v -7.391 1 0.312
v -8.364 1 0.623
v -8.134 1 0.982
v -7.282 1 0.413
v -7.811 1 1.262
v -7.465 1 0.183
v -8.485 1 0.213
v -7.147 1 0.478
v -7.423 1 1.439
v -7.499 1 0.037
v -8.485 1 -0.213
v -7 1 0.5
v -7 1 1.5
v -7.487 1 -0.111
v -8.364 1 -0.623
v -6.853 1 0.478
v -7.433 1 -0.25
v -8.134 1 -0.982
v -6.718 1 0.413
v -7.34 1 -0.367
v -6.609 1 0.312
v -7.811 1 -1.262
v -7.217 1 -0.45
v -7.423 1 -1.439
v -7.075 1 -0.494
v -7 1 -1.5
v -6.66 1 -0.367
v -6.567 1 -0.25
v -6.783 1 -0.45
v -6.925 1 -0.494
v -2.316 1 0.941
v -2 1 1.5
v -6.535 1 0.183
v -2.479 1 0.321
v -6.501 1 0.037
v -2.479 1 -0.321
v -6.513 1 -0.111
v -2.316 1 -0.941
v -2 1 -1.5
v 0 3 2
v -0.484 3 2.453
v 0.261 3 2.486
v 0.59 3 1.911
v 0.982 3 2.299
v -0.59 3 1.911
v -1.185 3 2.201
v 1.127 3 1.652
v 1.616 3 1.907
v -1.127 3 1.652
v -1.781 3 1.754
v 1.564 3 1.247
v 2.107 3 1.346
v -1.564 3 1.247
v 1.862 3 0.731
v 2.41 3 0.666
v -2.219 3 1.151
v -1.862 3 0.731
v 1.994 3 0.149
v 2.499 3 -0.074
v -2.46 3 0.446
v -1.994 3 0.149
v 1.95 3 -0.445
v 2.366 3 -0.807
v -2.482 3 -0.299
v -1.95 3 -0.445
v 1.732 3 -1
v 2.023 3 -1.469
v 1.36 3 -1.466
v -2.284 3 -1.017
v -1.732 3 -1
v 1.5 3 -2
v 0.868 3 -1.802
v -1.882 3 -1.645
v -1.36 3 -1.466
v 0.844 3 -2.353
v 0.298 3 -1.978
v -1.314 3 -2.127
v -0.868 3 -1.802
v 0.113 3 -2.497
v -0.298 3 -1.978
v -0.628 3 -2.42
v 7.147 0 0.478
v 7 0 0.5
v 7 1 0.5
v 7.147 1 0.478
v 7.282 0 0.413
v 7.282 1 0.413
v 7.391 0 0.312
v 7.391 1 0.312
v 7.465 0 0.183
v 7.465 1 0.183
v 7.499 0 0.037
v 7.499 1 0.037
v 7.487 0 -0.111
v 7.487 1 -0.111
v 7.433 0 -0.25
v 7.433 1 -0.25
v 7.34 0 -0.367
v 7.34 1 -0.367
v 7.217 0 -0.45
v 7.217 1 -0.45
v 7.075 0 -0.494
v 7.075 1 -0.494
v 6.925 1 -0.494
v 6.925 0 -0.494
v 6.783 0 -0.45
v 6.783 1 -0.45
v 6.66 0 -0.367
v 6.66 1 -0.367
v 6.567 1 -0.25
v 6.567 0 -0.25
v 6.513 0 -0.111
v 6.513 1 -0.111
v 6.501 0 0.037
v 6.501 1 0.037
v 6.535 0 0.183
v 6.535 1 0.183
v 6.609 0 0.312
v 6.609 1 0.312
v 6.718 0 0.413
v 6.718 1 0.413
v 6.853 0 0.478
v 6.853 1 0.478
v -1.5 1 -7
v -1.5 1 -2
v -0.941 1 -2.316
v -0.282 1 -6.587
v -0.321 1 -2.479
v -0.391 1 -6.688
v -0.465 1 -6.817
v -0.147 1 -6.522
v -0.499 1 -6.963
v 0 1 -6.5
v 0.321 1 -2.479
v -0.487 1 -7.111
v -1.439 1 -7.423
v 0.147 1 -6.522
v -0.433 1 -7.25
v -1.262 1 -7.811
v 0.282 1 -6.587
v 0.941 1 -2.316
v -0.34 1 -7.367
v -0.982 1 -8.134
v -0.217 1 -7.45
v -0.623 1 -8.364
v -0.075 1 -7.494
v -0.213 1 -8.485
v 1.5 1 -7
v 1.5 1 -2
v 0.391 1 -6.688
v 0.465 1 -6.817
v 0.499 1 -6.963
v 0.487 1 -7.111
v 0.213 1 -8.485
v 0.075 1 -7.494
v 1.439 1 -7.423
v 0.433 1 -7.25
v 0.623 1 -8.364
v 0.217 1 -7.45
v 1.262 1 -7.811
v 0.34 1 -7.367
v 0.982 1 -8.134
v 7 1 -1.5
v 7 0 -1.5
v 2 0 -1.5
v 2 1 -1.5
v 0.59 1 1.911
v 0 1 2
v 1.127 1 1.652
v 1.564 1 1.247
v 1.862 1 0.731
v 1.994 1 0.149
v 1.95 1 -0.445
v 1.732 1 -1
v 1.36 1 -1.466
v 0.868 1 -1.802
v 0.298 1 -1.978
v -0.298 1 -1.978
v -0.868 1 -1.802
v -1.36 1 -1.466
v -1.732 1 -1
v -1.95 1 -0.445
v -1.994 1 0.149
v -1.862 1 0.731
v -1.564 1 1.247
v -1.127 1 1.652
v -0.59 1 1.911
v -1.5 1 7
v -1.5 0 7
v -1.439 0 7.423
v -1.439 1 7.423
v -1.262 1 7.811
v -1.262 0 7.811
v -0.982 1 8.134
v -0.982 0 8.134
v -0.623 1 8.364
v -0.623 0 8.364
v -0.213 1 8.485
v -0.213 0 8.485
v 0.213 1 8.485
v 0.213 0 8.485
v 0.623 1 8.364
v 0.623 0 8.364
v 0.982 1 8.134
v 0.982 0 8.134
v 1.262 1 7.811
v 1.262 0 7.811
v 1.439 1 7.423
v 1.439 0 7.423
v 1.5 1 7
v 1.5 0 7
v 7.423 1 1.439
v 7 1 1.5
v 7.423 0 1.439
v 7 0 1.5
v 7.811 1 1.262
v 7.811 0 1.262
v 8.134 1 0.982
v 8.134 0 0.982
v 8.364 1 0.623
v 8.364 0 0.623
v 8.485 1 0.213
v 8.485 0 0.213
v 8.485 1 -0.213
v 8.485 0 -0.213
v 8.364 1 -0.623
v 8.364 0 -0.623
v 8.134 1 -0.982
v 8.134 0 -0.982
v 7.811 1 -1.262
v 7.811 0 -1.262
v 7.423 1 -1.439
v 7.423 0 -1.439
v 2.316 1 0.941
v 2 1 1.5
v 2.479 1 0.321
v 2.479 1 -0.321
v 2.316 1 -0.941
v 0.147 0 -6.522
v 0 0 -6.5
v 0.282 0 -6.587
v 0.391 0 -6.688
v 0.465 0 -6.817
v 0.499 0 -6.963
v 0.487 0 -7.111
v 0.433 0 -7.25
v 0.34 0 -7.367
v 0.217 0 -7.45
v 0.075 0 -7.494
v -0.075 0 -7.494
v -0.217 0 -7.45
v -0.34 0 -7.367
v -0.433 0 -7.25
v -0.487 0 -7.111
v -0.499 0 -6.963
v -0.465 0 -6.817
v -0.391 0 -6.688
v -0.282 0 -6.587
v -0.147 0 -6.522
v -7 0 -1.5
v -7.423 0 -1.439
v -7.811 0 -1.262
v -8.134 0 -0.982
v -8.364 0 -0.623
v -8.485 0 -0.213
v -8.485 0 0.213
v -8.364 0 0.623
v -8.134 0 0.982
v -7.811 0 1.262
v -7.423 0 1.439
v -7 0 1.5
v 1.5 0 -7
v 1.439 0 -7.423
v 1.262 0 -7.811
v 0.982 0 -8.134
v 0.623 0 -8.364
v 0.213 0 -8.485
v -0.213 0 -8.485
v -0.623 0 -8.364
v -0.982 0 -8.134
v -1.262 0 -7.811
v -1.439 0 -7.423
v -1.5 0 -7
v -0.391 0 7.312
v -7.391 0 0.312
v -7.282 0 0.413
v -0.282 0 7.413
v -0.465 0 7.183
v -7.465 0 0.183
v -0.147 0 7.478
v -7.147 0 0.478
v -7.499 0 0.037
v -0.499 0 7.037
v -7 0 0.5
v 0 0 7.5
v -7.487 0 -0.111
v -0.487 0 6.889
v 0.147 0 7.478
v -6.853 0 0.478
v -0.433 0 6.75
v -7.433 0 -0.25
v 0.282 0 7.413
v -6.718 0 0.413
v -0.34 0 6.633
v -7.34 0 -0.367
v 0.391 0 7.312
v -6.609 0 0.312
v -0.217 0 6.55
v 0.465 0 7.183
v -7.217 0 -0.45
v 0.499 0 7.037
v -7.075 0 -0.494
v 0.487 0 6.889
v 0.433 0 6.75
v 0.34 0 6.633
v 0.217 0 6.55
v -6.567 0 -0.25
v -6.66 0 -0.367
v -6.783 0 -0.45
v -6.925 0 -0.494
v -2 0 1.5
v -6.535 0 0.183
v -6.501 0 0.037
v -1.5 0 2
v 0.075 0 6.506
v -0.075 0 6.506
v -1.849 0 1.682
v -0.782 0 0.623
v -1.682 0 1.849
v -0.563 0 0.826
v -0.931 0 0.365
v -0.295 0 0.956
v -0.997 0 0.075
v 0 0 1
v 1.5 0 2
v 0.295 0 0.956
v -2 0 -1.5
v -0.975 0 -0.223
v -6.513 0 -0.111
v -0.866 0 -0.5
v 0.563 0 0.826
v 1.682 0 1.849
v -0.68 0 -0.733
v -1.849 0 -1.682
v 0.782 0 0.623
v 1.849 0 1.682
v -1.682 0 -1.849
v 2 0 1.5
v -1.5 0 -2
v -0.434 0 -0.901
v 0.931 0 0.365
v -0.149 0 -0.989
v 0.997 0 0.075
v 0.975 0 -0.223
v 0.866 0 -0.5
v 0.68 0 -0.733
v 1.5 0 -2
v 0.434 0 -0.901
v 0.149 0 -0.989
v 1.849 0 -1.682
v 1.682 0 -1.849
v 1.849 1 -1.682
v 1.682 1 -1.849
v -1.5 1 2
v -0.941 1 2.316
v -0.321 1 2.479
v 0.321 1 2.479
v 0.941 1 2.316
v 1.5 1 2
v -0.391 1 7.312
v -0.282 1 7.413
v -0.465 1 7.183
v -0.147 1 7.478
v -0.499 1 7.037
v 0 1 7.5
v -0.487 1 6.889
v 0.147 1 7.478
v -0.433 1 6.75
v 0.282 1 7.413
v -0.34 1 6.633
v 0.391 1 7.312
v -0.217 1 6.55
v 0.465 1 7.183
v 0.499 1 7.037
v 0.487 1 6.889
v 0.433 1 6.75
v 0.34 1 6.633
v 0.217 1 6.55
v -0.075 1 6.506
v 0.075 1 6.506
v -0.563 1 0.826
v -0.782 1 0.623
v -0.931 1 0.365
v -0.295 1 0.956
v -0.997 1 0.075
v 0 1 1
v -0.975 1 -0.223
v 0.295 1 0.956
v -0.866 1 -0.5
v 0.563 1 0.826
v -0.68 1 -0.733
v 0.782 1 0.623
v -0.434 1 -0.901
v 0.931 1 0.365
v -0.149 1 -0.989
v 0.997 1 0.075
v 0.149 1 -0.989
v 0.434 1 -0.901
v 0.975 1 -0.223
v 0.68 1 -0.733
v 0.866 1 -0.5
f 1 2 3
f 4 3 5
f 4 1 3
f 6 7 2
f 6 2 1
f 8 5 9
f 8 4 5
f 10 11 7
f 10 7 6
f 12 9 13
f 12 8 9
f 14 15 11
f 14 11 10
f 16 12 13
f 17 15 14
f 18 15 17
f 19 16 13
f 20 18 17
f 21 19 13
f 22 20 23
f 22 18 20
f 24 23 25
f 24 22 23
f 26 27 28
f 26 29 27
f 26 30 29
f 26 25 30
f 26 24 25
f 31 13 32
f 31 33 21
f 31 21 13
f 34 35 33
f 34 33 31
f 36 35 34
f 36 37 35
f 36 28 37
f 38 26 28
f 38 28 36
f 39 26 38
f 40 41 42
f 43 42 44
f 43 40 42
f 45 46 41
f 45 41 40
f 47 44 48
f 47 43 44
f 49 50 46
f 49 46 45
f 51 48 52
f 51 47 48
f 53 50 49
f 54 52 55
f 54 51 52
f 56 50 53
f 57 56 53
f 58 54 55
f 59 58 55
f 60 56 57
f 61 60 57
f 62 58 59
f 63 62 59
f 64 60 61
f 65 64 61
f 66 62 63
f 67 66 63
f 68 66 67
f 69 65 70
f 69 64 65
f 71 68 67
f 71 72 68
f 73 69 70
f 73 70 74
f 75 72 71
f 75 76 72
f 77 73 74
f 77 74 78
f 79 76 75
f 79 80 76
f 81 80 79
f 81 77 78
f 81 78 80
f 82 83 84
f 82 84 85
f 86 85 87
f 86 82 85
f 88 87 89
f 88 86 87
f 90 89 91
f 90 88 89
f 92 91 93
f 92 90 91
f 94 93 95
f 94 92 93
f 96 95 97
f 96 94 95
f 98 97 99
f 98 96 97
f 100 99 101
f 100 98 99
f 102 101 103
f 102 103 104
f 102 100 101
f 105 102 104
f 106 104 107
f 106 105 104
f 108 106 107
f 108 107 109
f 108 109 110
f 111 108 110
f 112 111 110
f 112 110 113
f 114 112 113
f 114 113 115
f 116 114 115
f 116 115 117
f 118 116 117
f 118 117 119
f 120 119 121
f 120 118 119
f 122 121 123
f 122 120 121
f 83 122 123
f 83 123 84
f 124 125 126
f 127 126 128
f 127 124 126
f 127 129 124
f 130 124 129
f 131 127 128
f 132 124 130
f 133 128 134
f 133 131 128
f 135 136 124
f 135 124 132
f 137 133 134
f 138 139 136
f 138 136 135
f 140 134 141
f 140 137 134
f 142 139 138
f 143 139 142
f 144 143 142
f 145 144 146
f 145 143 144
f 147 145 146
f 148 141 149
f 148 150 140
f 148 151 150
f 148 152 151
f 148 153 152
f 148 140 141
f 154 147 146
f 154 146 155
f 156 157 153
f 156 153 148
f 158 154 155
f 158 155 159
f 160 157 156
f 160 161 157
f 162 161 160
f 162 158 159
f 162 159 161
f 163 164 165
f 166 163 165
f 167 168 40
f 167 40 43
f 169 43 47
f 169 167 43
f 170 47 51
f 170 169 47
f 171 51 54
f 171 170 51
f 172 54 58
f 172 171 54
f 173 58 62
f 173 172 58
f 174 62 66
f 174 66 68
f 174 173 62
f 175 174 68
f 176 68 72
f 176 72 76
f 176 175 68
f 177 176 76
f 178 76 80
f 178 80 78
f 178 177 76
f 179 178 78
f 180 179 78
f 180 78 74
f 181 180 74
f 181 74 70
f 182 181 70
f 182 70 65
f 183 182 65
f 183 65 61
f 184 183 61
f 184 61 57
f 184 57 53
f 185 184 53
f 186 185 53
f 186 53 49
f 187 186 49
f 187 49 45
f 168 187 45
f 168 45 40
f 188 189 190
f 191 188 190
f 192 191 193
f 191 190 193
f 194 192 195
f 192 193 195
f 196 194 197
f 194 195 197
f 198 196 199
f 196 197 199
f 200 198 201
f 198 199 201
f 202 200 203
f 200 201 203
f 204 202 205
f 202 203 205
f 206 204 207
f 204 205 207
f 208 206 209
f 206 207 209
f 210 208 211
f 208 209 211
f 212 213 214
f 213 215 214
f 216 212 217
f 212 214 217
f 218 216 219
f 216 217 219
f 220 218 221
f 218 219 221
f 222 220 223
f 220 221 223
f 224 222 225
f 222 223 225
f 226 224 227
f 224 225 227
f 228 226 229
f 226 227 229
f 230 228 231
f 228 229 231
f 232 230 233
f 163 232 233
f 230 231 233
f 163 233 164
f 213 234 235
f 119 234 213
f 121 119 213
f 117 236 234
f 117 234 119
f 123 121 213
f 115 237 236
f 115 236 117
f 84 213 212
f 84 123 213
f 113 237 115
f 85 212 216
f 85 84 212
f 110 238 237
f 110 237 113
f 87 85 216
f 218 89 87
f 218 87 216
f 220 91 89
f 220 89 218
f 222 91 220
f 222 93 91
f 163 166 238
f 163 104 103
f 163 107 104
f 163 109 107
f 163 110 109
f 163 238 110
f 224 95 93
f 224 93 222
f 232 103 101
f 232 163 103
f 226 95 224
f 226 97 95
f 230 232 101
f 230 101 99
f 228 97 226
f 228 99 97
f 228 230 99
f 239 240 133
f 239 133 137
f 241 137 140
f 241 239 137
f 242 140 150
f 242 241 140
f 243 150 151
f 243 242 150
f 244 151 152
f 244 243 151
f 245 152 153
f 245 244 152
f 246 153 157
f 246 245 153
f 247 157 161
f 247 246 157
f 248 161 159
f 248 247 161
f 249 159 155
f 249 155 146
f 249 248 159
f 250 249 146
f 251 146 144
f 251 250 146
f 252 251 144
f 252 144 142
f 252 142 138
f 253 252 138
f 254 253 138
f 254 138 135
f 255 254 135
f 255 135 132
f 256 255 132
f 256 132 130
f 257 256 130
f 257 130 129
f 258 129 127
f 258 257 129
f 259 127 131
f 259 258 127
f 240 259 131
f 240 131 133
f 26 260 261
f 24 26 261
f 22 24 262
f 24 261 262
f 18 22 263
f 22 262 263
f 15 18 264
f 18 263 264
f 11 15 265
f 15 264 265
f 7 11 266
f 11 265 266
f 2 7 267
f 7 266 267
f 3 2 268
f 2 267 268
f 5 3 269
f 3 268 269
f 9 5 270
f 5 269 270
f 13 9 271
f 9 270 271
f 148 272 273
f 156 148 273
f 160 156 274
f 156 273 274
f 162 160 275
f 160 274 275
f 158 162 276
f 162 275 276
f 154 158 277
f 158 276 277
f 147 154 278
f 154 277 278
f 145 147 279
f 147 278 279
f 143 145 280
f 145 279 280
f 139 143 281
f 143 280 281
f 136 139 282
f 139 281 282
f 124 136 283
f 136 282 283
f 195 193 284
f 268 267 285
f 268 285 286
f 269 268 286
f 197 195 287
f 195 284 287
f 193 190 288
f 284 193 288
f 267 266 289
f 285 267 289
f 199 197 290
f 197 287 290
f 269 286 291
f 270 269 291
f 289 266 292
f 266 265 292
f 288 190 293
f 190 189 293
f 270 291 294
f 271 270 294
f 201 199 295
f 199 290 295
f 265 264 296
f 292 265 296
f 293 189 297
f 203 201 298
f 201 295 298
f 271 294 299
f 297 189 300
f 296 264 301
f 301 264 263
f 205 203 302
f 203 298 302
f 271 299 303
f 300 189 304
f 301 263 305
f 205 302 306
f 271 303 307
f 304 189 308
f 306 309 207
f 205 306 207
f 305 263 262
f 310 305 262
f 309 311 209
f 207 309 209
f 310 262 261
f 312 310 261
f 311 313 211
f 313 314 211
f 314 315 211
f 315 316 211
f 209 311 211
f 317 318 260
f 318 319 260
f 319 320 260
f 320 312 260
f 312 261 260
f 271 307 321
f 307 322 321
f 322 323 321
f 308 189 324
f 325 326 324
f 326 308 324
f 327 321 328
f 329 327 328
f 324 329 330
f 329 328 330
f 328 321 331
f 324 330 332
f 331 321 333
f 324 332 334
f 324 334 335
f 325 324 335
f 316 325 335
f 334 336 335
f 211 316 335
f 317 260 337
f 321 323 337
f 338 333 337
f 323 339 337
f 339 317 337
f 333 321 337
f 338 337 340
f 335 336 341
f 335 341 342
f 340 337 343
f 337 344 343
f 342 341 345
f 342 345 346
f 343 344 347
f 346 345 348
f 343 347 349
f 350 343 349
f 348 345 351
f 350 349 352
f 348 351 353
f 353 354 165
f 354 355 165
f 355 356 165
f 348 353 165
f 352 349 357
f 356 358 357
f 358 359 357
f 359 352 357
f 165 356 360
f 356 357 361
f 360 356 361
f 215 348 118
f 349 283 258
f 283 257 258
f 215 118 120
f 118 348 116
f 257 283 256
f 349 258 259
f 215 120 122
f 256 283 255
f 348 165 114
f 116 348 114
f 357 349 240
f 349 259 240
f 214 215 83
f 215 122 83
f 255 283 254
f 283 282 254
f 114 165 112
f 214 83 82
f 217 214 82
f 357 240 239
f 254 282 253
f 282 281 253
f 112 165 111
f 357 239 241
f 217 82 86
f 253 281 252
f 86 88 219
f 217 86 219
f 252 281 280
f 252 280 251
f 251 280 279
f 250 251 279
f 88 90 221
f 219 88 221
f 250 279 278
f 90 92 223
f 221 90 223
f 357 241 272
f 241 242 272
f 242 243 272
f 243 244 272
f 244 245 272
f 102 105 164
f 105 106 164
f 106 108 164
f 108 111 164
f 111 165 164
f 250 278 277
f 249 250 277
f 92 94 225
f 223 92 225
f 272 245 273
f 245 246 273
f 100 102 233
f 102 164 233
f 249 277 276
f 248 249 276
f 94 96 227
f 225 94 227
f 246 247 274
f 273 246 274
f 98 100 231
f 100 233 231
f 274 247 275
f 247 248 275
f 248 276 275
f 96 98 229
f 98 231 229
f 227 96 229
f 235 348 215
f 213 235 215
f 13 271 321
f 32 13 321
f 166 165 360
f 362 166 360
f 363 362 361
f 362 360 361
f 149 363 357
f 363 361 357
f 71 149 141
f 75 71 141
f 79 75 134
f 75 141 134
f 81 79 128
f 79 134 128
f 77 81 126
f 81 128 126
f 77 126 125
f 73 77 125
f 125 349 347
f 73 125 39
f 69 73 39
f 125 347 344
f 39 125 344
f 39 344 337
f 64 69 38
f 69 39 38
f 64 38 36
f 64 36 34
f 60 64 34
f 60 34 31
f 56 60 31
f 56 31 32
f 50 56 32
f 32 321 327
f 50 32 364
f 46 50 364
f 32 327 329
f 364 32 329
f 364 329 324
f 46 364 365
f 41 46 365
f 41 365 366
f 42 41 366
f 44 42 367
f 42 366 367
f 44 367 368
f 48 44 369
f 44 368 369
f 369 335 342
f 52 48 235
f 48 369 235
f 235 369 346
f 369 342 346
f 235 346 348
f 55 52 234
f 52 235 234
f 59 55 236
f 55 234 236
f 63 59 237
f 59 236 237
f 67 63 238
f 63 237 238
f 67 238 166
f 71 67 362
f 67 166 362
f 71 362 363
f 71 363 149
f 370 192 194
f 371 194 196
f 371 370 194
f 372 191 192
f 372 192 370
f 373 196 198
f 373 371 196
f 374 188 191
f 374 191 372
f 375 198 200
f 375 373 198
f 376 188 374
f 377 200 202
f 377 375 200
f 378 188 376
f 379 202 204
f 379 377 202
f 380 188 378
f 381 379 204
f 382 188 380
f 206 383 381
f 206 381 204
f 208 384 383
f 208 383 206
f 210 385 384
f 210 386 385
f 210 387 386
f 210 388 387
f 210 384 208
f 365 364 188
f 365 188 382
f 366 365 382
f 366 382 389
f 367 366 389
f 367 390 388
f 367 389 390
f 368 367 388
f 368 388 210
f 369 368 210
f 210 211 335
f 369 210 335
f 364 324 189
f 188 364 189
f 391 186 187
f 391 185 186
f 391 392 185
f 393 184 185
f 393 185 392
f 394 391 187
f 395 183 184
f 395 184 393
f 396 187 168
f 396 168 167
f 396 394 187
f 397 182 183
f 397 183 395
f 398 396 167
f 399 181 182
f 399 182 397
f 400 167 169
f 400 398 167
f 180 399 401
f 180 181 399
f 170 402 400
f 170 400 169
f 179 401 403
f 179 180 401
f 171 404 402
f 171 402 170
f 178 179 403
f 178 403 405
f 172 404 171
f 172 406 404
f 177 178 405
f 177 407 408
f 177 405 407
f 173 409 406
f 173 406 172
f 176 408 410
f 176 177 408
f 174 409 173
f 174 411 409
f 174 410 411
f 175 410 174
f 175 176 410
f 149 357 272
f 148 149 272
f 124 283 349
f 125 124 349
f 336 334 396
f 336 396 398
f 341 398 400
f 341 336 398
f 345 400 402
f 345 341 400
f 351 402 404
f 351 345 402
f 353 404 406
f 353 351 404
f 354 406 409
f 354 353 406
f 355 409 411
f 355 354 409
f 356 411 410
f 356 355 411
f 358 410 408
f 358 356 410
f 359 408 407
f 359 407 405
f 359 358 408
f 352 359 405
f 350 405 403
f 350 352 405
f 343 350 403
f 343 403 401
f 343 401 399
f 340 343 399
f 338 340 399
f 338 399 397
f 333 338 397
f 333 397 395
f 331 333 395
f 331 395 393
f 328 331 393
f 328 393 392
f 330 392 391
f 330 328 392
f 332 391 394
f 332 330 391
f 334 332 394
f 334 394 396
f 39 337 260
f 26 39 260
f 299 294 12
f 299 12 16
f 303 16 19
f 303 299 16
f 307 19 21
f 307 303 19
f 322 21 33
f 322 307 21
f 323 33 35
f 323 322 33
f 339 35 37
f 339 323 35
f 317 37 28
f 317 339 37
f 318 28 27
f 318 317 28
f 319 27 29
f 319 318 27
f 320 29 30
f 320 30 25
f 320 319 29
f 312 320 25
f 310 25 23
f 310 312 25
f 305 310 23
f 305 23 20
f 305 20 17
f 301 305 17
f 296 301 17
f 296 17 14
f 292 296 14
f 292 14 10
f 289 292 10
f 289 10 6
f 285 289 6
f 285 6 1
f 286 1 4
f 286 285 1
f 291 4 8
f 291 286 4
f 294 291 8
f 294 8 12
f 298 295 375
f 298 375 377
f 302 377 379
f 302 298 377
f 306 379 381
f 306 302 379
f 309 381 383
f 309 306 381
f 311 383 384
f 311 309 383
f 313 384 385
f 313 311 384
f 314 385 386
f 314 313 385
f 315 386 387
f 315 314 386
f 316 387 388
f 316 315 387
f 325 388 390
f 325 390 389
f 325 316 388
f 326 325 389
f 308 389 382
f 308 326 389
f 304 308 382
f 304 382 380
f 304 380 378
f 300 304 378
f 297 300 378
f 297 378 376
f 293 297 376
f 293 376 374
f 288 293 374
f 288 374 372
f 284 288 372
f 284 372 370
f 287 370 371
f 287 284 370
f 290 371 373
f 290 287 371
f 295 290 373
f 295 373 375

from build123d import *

# Parameters (mm, degrees)
SKETCH4_R           = 0.5
SKETCH4_R_2         = 1
BOSS_EXTRUDE1_DEPTH = 1
SKETCH4_3_R         = 2.5
SKETCH4_3_R_2       = 2
BOSS_EXTRUDE2_DEPTH = 3


with BuildPart() as part:
    # Sketch4 → Boss-Extrude1 (new body)
    with BuildSketch(Plane(origin=(0, 0, 0), x_dir=(1, 0, 0), z_dir=(0, 1, 0))):
        with BuildLine():
            Line((2, -1.5), (7, -1.5))
            ThreePointArc((7, -1.5), (8.5, 0), (7, 1.5))
            Line((7, 1.5), (2, 1.5))
            ThreePointArc((2, 1.5), (1.767766953, 1.767766953), (1.5, 2))
            Line((1.5, 2), (1.5, 7))
            ThreePointArc((1.5, 7), (0, 8.5), (-1.5, 7))
            Line((-1.5, 7), (-1.5, 2))
            ThreePointArc((-1.5, 2), (-1.767766953, 1.767766953), (-2, 1.5))
            Line((-2, 1.5), (-7, 1.5))
            ThreePointArc((-7, 1.5), (-8.5, 0), (-7, -1.5))
            Line((-7, -1.5), (-2, -1.5))
            ThreePointArc((-2, -1.5), (-1.767766953, -1.767766953), (-1.5, -2))
            Line((-1.5, -2), (-1.5, -7))
            ThreePointArc((-1.5, -7), (0, -8.5), (1.5, -7))
            Line((1.5, -7), (1.5, -2))
            ThreePointArc((1.5, -2), (1.767766953, -1.767766953), (2, -1.5))
        make_face()
        with Locations((7, 0)):
            Circle(SKETCH4_R, mode=Mode.SUBTRACT)
        Circle(SKETCH4_R_2, mode=Mode.SUBTRACT)
        with Locations((0, -7)):
            Circle(SKETCH4_R, mode=Mode.SUBTRACT)
        with Locations((-7, 0)):
            Circle(SKETCH4_R, mode=Mode.SUBTRACT)
        with Locations((0, 7)):
            Circle(SKETCH4_R, mode=Mode.SUBTRACT)
    extrude(amount=BOSS_EXTRUDE1_DEPTH)

    # Sketch4<3> → Boss-Extrude2 (add)
    with BuildSketch(Plane(origin=(0, 0, 0), x_dir=(1, 0, 0), z_dir=(0, 1, 0))):
        Circle(SKETCH4_3_R)
        Circle(SKETCH4_3_R_2, mode=Mode.SUBTRACT)
    extrude(amount=BOSS_EXTRUDE2_DEPTH)


solid = part.part
